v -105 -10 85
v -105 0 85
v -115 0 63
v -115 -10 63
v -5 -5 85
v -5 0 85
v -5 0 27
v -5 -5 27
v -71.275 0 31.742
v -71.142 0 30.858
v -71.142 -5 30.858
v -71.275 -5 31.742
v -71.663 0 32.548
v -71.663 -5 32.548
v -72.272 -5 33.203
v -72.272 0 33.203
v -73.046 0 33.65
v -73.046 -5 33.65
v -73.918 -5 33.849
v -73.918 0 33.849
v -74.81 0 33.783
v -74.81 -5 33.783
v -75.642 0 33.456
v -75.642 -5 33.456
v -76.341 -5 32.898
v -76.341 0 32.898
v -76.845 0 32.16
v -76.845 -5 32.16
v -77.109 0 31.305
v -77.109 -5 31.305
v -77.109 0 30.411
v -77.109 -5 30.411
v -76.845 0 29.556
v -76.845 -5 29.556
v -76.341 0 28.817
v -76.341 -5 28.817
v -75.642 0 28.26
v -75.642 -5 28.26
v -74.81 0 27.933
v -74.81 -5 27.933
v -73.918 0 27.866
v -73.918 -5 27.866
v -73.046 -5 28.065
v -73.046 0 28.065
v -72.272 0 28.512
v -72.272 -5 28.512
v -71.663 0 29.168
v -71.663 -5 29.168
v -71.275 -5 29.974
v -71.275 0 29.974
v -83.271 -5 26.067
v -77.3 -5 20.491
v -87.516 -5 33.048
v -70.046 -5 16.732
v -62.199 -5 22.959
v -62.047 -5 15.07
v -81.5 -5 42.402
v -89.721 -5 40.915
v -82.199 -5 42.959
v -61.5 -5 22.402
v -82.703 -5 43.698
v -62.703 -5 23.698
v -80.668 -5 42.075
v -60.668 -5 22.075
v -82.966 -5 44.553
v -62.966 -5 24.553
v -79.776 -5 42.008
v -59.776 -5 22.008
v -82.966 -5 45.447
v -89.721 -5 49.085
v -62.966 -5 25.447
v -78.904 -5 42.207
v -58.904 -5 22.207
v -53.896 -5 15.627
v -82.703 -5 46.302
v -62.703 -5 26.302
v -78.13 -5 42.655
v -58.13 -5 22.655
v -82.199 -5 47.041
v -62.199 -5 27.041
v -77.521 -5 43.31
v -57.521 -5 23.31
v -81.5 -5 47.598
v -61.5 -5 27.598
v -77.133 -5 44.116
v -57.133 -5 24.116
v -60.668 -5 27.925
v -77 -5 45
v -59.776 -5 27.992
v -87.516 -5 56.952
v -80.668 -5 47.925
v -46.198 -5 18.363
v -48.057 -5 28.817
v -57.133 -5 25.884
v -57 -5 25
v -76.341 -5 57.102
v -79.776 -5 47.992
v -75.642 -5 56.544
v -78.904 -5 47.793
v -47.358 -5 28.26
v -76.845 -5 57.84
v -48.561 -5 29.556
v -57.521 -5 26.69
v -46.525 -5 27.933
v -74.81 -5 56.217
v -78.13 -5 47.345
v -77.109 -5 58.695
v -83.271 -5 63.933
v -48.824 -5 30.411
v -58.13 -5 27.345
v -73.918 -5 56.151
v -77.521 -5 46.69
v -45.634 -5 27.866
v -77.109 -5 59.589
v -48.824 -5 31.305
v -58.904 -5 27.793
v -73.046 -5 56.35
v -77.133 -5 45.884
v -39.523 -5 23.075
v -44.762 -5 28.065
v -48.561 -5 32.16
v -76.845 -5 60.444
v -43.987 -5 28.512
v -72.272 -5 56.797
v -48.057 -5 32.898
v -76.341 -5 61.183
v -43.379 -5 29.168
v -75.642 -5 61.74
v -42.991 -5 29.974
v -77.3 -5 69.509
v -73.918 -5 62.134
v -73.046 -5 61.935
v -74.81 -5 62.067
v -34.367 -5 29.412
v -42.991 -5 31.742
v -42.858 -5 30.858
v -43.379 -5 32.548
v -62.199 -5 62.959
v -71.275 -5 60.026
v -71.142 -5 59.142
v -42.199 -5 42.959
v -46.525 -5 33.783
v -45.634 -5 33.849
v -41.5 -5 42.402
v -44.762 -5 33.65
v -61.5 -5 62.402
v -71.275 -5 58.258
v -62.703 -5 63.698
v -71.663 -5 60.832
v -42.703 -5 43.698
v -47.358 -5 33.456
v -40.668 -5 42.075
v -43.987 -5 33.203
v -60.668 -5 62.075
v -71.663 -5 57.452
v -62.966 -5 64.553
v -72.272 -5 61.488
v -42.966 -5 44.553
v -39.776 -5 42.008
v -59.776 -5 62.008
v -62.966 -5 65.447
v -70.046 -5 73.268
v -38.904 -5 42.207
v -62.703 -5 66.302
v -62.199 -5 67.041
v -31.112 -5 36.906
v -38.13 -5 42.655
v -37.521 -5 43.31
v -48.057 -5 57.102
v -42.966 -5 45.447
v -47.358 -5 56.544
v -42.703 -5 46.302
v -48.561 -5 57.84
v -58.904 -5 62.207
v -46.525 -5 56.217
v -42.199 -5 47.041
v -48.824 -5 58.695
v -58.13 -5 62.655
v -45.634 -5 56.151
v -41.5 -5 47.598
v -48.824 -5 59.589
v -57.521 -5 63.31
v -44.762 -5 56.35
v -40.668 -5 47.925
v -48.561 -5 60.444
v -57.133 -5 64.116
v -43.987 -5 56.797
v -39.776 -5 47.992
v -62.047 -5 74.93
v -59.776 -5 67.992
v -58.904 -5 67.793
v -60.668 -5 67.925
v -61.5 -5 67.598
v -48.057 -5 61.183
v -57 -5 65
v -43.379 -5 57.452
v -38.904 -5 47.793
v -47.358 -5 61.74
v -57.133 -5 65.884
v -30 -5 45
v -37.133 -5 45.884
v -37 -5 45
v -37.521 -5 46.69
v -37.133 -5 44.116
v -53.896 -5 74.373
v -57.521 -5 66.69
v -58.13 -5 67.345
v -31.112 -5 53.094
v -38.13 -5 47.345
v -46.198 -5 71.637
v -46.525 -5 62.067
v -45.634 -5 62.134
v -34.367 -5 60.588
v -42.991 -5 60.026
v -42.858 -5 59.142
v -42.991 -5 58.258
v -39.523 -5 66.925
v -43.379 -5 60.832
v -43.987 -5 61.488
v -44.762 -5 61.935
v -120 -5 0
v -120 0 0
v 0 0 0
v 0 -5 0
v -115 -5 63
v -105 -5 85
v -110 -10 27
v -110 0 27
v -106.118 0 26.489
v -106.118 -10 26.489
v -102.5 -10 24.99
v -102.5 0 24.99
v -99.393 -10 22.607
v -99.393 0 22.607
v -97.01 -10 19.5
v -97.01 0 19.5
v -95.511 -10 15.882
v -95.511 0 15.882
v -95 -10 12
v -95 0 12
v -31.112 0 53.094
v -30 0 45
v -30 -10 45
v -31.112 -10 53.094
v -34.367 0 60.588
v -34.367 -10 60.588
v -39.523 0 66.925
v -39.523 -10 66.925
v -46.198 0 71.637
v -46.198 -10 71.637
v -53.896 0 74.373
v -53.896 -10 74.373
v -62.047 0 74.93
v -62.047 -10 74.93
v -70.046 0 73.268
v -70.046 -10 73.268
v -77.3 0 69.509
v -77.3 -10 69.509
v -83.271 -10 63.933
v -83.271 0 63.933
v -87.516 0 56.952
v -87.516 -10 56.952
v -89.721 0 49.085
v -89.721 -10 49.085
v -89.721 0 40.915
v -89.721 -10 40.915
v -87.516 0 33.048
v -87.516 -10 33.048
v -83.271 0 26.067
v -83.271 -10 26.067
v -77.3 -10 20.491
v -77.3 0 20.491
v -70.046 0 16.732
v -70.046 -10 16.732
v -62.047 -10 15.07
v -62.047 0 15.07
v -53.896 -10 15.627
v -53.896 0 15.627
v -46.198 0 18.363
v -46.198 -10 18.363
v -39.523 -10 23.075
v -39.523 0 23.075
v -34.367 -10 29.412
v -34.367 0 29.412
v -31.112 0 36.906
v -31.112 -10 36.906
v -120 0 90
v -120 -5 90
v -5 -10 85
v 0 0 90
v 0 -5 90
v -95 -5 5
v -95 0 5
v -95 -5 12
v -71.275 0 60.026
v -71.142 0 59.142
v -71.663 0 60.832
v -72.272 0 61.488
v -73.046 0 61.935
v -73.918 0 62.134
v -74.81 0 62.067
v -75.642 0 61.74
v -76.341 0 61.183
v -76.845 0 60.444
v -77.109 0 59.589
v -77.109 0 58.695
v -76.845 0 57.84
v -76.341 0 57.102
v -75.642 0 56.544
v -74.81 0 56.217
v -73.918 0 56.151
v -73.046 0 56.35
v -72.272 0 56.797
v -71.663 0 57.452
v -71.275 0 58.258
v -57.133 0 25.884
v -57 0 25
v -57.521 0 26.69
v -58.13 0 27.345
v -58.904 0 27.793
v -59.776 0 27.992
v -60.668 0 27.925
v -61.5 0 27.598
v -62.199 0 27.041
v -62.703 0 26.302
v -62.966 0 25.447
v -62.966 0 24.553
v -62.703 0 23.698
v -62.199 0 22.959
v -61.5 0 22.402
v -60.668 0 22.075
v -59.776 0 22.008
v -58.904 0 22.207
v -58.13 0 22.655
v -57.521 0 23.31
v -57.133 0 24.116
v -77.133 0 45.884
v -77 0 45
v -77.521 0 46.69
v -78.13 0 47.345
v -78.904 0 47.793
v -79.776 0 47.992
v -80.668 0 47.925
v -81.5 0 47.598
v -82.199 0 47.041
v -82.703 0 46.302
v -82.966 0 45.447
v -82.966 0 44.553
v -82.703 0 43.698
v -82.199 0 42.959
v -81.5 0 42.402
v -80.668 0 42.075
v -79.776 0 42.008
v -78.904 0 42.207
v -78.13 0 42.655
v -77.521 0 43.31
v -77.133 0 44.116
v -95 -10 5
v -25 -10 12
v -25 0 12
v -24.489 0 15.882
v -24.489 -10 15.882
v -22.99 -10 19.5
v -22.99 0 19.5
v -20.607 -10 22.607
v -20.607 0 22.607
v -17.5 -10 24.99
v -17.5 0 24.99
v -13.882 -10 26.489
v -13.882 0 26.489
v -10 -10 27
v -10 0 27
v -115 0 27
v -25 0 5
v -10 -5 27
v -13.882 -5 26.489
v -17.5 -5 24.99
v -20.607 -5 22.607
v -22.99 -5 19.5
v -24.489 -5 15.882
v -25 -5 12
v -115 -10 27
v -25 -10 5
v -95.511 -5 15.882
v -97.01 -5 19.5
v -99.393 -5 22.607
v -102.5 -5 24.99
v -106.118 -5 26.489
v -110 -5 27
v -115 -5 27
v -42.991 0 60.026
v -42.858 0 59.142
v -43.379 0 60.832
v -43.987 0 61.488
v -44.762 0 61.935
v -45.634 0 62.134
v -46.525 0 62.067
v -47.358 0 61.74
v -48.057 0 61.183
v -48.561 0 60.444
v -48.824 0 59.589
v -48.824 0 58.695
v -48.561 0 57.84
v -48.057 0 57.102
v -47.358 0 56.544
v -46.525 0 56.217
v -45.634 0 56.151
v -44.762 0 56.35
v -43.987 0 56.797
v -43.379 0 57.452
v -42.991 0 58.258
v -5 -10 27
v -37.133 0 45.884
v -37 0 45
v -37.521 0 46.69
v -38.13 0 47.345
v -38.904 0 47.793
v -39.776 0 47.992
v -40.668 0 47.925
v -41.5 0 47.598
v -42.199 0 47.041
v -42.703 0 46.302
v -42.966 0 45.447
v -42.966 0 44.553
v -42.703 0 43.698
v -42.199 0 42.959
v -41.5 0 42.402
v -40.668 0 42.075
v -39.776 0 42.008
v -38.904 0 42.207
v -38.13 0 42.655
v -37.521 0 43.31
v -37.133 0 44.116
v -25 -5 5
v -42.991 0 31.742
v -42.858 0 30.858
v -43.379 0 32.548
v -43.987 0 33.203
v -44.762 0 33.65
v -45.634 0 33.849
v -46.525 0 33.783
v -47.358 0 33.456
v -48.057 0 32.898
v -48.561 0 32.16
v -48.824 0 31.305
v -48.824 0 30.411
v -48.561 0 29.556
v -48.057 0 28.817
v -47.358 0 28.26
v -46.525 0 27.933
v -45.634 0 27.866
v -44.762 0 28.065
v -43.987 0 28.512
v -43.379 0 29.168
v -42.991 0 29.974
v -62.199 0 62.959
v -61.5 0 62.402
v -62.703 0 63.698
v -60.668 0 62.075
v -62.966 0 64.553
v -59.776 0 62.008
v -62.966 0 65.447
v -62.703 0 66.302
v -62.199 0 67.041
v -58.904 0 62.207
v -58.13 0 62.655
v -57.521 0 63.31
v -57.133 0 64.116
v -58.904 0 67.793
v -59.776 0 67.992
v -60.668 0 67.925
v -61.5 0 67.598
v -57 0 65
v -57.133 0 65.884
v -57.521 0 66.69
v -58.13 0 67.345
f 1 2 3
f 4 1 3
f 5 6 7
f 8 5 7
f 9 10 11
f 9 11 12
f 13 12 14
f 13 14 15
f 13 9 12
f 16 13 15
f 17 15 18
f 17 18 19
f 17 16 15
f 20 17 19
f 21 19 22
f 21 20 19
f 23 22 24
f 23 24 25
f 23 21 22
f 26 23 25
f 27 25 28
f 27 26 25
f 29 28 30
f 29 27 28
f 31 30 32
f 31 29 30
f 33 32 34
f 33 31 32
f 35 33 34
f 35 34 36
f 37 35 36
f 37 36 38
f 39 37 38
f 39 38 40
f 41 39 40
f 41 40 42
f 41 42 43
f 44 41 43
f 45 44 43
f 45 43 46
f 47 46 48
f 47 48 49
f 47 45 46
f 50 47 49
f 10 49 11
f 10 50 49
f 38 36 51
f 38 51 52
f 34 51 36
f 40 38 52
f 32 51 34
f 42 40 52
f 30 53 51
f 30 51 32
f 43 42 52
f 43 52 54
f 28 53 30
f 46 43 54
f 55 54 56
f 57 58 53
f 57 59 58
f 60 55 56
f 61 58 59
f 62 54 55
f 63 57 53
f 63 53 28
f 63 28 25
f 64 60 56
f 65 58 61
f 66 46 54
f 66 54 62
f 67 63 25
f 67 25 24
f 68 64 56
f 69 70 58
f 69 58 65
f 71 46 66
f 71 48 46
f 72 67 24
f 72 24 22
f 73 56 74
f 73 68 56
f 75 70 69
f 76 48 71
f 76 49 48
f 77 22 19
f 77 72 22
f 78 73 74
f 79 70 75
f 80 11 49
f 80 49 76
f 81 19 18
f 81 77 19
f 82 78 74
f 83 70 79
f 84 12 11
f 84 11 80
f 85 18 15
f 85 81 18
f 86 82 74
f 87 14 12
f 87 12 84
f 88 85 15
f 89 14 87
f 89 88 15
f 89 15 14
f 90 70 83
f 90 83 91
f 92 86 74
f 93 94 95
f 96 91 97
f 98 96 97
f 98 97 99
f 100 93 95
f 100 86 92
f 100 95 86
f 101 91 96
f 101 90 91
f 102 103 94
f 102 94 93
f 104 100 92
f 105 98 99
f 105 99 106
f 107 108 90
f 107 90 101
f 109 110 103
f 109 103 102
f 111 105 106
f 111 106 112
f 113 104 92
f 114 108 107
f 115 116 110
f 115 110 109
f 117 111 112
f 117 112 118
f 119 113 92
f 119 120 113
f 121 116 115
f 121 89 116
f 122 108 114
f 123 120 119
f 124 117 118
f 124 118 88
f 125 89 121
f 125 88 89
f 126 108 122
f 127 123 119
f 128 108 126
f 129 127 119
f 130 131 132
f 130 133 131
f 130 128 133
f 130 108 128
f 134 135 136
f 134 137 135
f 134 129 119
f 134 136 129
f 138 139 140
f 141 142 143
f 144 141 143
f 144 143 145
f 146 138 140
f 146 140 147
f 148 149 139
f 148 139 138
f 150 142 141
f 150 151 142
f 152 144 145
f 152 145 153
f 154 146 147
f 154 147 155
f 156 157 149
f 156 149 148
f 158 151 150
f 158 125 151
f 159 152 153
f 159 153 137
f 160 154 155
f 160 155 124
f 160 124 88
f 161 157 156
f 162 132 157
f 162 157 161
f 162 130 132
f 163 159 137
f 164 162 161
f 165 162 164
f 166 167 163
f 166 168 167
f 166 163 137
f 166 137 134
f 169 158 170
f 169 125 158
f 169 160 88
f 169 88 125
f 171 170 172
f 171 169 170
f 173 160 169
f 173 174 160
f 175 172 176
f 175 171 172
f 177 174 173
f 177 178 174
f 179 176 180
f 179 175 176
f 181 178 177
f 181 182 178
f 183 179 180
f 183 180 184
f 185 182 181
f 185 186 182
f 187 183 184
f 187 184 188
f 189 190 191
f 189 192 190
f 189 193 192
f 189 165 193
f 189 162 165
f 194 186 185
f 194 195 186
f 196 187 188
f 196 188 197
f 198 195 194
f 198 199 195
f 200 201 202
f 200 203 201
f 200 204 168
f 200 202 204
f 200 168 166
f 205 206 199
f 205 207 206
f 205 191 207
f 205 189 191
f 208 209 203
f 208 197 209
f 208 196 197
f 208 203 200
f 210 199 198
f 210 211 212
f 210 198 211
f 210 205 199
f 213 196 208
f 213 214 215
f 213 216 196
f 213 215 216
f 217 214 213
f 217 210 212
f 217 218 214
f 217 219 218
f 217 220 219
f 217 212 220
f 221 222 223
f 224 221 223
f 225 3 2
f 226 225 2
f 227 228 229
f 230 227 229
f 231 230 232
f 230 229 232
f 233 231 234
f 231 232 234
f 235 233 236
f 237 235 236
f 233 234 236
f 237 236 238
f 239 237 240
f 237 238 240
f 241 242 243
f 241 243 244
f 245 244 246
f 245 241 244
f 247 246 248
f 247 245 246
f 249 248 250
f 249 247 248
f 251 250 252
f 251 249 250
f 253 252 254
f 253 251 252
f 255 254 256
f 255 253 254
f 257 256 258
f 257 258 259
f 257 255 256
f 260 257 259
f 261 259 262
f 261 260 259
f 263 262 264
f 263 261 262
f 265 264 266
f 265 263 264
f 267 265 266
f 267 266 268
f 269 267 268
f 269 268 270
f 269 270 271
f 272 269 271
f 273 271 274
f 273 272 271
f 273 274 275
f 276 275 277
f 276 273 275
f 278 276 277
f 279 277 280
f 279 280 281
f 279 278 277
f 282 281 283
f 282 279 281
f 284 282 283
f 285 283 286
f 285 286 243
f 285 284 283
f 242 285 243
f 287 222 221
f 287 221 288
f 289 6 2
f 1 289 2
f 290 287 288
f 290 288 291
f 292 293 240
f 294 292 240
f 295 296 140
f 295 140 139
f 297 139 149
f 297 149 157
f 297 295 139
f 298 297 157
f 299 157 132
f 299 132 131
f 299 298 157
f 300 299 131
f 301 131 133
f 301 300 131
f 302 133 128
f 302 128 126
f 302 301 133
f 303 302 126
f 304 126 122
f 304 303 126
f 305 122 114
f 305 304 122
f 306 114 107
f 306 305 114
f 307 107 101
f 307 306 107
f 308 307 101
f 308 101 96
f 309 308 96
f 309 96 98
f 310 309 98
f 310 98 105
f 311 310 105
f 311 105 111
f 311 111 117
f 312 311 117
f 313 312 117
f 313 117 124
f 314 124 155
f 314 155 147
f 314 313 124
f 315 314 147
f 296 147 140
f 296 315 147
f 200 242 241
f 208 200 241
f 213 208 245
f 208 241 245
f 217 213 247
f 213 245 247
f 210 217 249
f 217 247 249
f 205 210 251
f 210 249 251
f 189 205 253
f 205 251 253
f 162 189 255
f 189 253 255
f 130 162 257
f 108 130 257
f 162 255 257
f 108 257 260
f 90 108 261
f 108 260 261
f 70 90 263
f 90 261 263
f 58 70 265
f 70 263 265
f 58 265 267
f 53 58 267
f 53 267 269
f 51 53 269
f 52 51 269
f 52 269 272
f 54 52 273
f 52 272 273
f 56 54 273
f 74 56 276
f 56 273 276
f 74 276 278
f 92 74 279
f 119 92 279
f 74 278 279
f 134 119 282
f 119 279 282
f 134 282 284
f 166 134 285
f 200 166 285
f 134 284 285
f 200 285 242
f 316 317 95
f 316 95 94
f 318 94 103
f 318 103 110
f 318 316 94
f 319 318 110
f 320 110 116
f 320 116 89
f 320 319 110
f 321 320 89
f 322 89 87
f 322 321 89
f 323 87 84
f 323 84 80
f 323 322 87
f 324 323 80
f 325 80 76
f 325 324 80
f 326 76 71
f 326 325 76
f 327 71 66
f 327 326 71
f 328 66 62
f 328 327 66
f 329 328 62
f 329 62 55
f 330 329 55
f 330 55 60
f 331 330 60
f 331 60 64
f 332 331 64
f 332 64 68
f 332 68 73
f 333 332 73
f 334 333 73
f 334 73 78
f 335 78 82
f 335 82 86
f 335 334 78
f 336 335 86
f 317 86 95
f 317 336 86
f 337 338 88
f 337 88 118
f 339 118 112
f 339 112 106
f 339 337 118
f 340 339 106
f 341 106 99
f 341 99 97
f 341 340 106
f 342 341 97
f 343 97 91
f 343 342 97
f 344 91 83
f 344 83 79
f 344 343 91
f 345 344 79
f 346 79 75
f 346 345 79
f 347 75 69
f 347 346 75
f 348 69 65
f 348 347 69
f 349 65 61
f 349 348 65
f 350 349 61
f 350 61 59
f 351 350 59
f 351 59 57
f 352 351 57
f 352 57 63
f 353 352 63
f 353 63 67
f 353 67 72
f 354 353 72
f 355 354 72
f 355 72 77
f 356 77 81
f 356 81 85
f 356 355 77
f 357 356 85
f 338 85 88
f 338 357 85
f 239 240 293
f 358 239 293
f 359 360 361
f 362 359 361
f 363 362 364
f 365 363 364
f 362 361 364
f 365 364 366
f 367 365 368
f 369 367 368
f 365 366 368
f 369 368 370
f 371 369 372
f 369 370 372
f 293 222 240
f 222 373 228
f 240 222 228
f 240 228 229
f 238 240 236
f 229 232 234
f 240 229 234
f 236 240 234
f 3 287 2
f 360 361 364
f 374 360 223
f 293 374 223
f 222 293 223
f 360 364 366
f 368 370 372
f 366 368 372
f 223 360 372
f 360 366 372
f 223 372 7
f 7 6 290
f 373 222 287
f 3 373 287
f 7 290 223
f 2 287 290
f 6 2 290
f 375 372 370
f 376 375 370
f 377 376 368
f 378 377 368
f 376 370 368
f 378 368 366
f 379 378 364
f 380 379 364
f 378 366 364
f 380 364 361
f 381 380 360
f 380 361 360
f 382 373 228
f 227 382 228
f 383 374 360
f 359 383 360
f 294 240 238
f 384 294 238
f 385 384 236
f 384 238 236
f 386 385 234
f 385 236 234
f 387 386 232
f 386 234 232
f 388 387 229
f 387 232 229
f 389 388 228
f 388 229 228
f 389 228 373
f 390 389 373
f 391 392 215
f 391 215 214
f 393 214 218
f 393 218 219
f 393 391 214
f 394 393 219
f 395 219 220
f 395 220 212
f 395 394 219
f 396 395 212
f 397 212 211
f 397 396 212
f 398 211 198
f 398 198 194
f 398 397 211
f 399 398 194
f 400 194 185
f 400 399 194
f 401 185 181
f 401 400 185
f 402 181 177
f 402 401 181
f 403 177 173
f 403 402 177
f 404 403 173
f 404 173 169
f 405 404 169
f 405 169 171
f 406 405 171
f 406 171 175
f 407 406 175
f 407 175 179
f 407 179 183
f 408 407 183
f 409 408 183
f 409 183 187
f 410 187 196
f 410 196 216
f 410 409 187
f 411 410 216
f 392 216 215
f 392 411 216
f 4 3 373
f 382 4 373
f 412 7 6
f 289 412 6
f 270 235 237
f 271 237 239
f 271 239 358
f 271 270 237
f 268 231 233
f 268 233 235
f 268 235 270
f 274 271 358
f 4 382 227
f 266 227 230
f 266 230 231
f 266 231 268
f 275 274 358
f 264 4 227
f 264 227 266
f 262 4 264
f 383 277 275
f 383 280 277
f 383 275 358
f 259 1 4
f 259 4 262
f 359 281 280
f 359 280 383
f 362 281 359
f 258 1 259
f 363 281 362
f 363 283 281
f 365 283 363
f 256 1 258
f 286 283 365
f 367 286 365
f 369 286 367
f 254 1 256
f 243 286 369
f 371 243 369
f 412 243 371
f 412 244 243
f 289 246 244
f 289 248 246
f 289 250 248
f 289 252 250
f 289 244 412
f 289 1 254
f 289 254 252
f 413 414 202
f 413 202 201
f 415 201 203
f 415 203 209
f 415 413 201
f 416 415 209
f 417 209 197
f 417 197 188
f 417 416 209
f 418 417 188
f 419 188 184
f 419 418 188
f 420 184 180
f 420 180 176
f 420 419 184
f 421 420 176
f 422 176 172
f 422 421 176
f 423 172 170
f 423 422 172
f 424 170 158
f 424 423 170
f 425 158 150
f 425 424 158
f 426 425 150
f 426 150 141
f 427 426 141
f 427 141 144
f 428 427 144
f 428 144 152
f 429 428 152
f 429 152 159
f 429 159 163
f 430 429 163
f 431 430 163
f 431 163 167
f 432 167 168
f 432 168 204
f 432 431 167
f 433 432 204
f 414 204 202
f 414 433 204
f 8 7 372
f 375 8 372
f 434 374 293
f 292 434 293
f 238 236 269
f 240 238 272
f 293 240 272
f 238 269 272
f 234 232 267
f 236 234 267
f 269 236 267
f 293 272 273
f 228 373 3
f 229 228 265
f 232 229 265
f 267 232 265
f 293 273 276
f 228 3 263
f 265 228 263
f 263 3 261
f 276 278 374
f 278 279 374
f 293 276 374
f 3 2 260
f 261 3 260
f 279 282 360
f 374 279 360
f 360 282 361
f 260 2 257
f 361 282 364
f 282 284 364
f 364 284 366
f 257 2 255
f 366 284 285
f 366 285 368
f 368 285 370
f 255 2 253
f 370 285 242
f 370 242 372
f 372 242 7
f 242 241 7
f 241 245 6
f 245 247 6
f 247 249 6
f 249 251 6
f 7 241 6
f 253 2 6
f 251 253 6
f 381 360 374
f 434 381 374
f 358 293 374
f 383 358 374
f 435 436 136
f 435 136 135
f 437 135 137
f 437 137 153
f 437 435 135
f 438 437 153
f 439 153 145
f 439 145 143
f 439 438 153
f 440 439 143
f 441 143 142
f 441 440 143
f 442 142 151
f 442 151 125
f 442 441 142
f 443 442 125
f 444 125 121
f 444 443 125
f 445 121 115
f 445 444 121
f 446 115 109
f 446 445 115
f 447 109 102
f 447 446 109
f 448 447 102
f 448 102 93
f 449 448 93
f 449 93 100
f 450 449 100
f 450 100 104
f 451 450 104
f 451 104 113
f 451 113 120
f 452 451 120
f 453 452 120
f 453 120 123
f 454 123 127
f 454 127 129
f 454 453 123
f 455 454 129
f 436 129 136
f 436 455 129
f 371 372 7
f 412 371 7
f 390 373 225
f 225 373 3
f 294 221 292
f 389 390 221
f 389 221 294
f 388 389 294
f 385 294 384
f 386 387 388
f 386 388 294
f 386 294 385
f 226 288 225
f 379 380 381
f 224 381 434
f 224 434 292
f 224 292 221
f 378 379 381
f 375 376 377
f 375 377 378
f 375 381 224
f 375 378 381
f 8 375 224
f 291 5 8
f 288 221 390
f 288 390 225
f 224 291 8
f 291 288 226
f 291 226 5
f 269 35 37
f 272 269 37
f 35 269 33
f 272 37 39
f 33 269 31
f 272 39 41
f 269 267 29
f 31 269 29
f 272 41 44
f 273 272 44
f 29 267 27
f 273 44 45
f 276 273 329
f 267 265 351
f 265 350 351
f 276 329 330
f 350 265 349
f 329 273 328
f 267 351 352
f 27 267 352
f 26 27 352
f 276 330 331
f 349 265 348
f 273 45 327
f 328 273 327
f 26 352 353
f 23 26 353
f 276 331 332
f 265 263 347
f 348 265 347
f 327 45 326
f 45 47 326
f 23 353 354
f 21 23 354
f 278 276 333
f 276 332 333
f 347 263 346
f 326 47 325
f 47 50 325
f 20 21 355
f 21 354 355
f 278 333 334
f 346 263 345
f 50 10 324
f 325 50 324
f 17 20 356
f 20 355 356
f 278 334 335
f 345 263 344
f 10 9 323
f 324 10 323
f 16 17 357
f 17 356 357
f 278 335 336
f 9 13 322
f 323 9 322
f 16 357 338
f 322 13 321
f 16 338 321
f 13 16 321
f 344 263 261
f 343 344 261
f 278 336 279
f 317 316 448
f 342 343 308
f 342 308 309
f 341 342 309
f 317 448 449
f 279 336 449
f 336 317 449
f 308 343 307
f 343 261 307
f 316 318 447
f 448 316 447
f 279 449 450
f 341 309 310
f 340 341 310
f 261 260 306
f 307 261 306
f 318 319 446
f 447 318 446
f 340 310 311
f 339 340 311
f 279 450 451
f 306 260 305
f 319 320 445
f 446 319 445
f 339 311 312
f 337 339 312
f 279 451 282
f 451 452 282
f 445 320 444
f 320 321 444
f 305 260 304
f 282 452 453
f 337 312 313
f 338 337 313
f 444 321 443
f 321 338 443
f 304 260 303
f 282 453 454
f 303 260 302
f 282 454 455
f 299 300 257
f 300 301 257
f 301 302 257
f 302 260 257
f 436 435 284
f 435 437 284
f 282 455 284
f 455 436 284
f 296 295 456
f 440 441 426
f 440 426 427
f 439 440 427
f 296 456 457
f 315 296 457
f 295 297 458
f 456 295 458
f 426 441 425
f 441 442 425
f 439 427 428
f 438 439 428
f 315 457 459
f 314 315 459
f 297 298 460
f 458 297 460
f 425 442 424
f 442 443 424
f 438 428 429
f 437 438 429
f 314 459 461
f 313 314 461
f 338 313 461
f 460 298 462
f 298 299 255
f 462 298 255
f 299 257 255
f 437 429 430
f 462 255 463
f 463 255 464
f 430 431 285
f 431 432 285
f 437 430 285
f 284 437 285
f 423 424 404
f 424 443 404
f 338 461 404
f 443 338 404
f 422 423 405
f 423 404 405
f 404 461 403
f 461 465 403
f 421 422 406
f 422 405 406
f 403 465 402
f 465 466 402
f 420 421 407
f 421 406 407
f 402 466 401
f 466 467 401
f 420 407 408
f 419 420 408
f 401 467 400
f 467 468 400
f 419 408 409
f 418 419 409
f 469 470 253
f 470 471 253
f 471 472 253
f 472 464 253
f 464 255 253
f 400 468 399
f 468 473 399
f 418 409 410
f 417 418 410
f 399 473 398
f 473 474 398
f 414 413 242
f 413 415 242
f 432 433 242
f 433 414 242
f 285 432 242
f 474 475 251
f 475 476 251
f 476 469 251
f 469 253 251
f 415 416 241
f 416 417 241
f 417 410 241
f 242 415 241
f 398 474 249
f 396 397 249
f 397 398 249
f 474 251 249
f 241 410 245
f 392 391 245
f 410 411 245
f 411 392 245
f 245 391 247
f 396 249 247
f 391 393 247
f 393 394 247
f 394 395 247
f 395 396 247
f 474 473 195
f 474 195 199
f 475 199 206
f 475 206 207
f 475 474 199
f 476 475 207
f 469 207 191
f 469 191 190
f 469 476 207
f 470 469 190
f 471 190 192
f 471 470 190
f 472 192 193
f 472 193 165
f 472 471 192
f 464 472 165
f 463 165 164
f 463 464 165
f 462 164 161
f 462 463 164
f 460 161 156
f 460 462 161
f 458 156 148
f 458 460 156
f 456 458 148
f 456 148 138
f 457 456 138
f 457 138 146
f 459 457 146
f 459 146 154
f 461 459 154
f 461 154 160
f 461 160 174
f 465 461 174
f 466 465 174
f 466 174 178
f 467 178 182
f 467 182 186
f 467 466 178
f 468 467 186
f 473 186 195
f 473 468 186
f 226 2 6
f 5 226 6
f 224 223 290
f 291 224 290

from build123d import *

# Parameters (mm, degrees)
F0_W     = 120
F0_H     = 90
F0_R     = 30
F0_R_2   = 3
F1_DEPTH = 5
F2_DEPTH = 10


with BuildPart() as f1:
    # F0 (on Front) → F1 (new body)
    with BuildSketch(Plane.XZ):
        with Locations((-60, 45)):
            Rectangle(F0_W, F0_H)
        with BuildLine():
            Line((-110, 27), (-115, 27))
            Line((-115, 27), (-115, 63))
            Line((-115, 63), (-105, 85))
            Line((-105, 85), (-5, 85))
            Line((-5, 85), (-5, 27))
            Line((-5, 27), (-10, 27))
            ThreePointArc((-10, 27), (-20.606602, 22.606602), (-25, 12))
            Line((-25, 12), (-25, 5))
            Line((-25, 5), (-95, 5))
            Line((-95, 5), (-95, 12))
            ThreePointArc((-95, 12), (-99.393398, 22.606602), (-110, 27))
        make_face(mode=Mode.SUBTRACT)
        with Locations((-60, 45)):
            Circle(F0_R)
        with Locations((-74.142136, 30.857864)):
            Circle(F0_R_2, mode=Mode.SUBTRACT)
        with Locations((-60, 25)):
            Circle(F0_R_2, mode=Mode.SUBTRACT)
        with Locations((-45.857864, 30.857864)):
            Circle(F0_R_2, mode=Mode.SUBTRACT)
        with Locations((-80, 45)):
            Circle(F0_R_2, mode=Mode.SUBTRACT)
        with Locations((-74.142136, 59.142136)):
            Circle(F0_R_2, mode=Mode.SUBTRACT)
        with Locations((-40, 45)):
            Circle(F0_R_2, mode=Mode.SUBTRACT)
        with Locations((-45.857864, 59.142136)):
            Circle(F0_R_2, mode=Mode.SUBTRACT)
        with Locations((-60, 65)):
            Circle(F0_R_2, mode=Mode.SUBTRACT)
    extrude(amount=F1_DEPTH)


with BuildPart() as f2:
    # F0 (on Front) → F2 (new body)
    with BuildSketch(Plane.XZ):
        with BuildLine():
            Line((-115, 63), (-115, 27))
            Line((-115, 27), (-110, 27))
            ThreePointArc((-110, 27), (-99.393398, 22.606602), (-95, 12))
            Line((-95, 12), (-95, 5))
            Line((-95, 5), (-25, 5))
            Line((-25, 5), (-25, 12))
            ThreePointArc((-25, 12), (-20.606602, 22.606602), (-10, 27))
            Line((-10, 27), (-5, 27))
            Line((-5, 27), (-5, 85))
            Line((-5, 85), (-105, 85))
            Line((-105, 85), (-115, 63))
        make_face()
        with Locations((-60, 45)):
            Circle(F0_R, mode=Mode.SUBTRACT)
    extrude(amount=F2_DEPTH)


solid = Compound([f1.part, f2.part])
